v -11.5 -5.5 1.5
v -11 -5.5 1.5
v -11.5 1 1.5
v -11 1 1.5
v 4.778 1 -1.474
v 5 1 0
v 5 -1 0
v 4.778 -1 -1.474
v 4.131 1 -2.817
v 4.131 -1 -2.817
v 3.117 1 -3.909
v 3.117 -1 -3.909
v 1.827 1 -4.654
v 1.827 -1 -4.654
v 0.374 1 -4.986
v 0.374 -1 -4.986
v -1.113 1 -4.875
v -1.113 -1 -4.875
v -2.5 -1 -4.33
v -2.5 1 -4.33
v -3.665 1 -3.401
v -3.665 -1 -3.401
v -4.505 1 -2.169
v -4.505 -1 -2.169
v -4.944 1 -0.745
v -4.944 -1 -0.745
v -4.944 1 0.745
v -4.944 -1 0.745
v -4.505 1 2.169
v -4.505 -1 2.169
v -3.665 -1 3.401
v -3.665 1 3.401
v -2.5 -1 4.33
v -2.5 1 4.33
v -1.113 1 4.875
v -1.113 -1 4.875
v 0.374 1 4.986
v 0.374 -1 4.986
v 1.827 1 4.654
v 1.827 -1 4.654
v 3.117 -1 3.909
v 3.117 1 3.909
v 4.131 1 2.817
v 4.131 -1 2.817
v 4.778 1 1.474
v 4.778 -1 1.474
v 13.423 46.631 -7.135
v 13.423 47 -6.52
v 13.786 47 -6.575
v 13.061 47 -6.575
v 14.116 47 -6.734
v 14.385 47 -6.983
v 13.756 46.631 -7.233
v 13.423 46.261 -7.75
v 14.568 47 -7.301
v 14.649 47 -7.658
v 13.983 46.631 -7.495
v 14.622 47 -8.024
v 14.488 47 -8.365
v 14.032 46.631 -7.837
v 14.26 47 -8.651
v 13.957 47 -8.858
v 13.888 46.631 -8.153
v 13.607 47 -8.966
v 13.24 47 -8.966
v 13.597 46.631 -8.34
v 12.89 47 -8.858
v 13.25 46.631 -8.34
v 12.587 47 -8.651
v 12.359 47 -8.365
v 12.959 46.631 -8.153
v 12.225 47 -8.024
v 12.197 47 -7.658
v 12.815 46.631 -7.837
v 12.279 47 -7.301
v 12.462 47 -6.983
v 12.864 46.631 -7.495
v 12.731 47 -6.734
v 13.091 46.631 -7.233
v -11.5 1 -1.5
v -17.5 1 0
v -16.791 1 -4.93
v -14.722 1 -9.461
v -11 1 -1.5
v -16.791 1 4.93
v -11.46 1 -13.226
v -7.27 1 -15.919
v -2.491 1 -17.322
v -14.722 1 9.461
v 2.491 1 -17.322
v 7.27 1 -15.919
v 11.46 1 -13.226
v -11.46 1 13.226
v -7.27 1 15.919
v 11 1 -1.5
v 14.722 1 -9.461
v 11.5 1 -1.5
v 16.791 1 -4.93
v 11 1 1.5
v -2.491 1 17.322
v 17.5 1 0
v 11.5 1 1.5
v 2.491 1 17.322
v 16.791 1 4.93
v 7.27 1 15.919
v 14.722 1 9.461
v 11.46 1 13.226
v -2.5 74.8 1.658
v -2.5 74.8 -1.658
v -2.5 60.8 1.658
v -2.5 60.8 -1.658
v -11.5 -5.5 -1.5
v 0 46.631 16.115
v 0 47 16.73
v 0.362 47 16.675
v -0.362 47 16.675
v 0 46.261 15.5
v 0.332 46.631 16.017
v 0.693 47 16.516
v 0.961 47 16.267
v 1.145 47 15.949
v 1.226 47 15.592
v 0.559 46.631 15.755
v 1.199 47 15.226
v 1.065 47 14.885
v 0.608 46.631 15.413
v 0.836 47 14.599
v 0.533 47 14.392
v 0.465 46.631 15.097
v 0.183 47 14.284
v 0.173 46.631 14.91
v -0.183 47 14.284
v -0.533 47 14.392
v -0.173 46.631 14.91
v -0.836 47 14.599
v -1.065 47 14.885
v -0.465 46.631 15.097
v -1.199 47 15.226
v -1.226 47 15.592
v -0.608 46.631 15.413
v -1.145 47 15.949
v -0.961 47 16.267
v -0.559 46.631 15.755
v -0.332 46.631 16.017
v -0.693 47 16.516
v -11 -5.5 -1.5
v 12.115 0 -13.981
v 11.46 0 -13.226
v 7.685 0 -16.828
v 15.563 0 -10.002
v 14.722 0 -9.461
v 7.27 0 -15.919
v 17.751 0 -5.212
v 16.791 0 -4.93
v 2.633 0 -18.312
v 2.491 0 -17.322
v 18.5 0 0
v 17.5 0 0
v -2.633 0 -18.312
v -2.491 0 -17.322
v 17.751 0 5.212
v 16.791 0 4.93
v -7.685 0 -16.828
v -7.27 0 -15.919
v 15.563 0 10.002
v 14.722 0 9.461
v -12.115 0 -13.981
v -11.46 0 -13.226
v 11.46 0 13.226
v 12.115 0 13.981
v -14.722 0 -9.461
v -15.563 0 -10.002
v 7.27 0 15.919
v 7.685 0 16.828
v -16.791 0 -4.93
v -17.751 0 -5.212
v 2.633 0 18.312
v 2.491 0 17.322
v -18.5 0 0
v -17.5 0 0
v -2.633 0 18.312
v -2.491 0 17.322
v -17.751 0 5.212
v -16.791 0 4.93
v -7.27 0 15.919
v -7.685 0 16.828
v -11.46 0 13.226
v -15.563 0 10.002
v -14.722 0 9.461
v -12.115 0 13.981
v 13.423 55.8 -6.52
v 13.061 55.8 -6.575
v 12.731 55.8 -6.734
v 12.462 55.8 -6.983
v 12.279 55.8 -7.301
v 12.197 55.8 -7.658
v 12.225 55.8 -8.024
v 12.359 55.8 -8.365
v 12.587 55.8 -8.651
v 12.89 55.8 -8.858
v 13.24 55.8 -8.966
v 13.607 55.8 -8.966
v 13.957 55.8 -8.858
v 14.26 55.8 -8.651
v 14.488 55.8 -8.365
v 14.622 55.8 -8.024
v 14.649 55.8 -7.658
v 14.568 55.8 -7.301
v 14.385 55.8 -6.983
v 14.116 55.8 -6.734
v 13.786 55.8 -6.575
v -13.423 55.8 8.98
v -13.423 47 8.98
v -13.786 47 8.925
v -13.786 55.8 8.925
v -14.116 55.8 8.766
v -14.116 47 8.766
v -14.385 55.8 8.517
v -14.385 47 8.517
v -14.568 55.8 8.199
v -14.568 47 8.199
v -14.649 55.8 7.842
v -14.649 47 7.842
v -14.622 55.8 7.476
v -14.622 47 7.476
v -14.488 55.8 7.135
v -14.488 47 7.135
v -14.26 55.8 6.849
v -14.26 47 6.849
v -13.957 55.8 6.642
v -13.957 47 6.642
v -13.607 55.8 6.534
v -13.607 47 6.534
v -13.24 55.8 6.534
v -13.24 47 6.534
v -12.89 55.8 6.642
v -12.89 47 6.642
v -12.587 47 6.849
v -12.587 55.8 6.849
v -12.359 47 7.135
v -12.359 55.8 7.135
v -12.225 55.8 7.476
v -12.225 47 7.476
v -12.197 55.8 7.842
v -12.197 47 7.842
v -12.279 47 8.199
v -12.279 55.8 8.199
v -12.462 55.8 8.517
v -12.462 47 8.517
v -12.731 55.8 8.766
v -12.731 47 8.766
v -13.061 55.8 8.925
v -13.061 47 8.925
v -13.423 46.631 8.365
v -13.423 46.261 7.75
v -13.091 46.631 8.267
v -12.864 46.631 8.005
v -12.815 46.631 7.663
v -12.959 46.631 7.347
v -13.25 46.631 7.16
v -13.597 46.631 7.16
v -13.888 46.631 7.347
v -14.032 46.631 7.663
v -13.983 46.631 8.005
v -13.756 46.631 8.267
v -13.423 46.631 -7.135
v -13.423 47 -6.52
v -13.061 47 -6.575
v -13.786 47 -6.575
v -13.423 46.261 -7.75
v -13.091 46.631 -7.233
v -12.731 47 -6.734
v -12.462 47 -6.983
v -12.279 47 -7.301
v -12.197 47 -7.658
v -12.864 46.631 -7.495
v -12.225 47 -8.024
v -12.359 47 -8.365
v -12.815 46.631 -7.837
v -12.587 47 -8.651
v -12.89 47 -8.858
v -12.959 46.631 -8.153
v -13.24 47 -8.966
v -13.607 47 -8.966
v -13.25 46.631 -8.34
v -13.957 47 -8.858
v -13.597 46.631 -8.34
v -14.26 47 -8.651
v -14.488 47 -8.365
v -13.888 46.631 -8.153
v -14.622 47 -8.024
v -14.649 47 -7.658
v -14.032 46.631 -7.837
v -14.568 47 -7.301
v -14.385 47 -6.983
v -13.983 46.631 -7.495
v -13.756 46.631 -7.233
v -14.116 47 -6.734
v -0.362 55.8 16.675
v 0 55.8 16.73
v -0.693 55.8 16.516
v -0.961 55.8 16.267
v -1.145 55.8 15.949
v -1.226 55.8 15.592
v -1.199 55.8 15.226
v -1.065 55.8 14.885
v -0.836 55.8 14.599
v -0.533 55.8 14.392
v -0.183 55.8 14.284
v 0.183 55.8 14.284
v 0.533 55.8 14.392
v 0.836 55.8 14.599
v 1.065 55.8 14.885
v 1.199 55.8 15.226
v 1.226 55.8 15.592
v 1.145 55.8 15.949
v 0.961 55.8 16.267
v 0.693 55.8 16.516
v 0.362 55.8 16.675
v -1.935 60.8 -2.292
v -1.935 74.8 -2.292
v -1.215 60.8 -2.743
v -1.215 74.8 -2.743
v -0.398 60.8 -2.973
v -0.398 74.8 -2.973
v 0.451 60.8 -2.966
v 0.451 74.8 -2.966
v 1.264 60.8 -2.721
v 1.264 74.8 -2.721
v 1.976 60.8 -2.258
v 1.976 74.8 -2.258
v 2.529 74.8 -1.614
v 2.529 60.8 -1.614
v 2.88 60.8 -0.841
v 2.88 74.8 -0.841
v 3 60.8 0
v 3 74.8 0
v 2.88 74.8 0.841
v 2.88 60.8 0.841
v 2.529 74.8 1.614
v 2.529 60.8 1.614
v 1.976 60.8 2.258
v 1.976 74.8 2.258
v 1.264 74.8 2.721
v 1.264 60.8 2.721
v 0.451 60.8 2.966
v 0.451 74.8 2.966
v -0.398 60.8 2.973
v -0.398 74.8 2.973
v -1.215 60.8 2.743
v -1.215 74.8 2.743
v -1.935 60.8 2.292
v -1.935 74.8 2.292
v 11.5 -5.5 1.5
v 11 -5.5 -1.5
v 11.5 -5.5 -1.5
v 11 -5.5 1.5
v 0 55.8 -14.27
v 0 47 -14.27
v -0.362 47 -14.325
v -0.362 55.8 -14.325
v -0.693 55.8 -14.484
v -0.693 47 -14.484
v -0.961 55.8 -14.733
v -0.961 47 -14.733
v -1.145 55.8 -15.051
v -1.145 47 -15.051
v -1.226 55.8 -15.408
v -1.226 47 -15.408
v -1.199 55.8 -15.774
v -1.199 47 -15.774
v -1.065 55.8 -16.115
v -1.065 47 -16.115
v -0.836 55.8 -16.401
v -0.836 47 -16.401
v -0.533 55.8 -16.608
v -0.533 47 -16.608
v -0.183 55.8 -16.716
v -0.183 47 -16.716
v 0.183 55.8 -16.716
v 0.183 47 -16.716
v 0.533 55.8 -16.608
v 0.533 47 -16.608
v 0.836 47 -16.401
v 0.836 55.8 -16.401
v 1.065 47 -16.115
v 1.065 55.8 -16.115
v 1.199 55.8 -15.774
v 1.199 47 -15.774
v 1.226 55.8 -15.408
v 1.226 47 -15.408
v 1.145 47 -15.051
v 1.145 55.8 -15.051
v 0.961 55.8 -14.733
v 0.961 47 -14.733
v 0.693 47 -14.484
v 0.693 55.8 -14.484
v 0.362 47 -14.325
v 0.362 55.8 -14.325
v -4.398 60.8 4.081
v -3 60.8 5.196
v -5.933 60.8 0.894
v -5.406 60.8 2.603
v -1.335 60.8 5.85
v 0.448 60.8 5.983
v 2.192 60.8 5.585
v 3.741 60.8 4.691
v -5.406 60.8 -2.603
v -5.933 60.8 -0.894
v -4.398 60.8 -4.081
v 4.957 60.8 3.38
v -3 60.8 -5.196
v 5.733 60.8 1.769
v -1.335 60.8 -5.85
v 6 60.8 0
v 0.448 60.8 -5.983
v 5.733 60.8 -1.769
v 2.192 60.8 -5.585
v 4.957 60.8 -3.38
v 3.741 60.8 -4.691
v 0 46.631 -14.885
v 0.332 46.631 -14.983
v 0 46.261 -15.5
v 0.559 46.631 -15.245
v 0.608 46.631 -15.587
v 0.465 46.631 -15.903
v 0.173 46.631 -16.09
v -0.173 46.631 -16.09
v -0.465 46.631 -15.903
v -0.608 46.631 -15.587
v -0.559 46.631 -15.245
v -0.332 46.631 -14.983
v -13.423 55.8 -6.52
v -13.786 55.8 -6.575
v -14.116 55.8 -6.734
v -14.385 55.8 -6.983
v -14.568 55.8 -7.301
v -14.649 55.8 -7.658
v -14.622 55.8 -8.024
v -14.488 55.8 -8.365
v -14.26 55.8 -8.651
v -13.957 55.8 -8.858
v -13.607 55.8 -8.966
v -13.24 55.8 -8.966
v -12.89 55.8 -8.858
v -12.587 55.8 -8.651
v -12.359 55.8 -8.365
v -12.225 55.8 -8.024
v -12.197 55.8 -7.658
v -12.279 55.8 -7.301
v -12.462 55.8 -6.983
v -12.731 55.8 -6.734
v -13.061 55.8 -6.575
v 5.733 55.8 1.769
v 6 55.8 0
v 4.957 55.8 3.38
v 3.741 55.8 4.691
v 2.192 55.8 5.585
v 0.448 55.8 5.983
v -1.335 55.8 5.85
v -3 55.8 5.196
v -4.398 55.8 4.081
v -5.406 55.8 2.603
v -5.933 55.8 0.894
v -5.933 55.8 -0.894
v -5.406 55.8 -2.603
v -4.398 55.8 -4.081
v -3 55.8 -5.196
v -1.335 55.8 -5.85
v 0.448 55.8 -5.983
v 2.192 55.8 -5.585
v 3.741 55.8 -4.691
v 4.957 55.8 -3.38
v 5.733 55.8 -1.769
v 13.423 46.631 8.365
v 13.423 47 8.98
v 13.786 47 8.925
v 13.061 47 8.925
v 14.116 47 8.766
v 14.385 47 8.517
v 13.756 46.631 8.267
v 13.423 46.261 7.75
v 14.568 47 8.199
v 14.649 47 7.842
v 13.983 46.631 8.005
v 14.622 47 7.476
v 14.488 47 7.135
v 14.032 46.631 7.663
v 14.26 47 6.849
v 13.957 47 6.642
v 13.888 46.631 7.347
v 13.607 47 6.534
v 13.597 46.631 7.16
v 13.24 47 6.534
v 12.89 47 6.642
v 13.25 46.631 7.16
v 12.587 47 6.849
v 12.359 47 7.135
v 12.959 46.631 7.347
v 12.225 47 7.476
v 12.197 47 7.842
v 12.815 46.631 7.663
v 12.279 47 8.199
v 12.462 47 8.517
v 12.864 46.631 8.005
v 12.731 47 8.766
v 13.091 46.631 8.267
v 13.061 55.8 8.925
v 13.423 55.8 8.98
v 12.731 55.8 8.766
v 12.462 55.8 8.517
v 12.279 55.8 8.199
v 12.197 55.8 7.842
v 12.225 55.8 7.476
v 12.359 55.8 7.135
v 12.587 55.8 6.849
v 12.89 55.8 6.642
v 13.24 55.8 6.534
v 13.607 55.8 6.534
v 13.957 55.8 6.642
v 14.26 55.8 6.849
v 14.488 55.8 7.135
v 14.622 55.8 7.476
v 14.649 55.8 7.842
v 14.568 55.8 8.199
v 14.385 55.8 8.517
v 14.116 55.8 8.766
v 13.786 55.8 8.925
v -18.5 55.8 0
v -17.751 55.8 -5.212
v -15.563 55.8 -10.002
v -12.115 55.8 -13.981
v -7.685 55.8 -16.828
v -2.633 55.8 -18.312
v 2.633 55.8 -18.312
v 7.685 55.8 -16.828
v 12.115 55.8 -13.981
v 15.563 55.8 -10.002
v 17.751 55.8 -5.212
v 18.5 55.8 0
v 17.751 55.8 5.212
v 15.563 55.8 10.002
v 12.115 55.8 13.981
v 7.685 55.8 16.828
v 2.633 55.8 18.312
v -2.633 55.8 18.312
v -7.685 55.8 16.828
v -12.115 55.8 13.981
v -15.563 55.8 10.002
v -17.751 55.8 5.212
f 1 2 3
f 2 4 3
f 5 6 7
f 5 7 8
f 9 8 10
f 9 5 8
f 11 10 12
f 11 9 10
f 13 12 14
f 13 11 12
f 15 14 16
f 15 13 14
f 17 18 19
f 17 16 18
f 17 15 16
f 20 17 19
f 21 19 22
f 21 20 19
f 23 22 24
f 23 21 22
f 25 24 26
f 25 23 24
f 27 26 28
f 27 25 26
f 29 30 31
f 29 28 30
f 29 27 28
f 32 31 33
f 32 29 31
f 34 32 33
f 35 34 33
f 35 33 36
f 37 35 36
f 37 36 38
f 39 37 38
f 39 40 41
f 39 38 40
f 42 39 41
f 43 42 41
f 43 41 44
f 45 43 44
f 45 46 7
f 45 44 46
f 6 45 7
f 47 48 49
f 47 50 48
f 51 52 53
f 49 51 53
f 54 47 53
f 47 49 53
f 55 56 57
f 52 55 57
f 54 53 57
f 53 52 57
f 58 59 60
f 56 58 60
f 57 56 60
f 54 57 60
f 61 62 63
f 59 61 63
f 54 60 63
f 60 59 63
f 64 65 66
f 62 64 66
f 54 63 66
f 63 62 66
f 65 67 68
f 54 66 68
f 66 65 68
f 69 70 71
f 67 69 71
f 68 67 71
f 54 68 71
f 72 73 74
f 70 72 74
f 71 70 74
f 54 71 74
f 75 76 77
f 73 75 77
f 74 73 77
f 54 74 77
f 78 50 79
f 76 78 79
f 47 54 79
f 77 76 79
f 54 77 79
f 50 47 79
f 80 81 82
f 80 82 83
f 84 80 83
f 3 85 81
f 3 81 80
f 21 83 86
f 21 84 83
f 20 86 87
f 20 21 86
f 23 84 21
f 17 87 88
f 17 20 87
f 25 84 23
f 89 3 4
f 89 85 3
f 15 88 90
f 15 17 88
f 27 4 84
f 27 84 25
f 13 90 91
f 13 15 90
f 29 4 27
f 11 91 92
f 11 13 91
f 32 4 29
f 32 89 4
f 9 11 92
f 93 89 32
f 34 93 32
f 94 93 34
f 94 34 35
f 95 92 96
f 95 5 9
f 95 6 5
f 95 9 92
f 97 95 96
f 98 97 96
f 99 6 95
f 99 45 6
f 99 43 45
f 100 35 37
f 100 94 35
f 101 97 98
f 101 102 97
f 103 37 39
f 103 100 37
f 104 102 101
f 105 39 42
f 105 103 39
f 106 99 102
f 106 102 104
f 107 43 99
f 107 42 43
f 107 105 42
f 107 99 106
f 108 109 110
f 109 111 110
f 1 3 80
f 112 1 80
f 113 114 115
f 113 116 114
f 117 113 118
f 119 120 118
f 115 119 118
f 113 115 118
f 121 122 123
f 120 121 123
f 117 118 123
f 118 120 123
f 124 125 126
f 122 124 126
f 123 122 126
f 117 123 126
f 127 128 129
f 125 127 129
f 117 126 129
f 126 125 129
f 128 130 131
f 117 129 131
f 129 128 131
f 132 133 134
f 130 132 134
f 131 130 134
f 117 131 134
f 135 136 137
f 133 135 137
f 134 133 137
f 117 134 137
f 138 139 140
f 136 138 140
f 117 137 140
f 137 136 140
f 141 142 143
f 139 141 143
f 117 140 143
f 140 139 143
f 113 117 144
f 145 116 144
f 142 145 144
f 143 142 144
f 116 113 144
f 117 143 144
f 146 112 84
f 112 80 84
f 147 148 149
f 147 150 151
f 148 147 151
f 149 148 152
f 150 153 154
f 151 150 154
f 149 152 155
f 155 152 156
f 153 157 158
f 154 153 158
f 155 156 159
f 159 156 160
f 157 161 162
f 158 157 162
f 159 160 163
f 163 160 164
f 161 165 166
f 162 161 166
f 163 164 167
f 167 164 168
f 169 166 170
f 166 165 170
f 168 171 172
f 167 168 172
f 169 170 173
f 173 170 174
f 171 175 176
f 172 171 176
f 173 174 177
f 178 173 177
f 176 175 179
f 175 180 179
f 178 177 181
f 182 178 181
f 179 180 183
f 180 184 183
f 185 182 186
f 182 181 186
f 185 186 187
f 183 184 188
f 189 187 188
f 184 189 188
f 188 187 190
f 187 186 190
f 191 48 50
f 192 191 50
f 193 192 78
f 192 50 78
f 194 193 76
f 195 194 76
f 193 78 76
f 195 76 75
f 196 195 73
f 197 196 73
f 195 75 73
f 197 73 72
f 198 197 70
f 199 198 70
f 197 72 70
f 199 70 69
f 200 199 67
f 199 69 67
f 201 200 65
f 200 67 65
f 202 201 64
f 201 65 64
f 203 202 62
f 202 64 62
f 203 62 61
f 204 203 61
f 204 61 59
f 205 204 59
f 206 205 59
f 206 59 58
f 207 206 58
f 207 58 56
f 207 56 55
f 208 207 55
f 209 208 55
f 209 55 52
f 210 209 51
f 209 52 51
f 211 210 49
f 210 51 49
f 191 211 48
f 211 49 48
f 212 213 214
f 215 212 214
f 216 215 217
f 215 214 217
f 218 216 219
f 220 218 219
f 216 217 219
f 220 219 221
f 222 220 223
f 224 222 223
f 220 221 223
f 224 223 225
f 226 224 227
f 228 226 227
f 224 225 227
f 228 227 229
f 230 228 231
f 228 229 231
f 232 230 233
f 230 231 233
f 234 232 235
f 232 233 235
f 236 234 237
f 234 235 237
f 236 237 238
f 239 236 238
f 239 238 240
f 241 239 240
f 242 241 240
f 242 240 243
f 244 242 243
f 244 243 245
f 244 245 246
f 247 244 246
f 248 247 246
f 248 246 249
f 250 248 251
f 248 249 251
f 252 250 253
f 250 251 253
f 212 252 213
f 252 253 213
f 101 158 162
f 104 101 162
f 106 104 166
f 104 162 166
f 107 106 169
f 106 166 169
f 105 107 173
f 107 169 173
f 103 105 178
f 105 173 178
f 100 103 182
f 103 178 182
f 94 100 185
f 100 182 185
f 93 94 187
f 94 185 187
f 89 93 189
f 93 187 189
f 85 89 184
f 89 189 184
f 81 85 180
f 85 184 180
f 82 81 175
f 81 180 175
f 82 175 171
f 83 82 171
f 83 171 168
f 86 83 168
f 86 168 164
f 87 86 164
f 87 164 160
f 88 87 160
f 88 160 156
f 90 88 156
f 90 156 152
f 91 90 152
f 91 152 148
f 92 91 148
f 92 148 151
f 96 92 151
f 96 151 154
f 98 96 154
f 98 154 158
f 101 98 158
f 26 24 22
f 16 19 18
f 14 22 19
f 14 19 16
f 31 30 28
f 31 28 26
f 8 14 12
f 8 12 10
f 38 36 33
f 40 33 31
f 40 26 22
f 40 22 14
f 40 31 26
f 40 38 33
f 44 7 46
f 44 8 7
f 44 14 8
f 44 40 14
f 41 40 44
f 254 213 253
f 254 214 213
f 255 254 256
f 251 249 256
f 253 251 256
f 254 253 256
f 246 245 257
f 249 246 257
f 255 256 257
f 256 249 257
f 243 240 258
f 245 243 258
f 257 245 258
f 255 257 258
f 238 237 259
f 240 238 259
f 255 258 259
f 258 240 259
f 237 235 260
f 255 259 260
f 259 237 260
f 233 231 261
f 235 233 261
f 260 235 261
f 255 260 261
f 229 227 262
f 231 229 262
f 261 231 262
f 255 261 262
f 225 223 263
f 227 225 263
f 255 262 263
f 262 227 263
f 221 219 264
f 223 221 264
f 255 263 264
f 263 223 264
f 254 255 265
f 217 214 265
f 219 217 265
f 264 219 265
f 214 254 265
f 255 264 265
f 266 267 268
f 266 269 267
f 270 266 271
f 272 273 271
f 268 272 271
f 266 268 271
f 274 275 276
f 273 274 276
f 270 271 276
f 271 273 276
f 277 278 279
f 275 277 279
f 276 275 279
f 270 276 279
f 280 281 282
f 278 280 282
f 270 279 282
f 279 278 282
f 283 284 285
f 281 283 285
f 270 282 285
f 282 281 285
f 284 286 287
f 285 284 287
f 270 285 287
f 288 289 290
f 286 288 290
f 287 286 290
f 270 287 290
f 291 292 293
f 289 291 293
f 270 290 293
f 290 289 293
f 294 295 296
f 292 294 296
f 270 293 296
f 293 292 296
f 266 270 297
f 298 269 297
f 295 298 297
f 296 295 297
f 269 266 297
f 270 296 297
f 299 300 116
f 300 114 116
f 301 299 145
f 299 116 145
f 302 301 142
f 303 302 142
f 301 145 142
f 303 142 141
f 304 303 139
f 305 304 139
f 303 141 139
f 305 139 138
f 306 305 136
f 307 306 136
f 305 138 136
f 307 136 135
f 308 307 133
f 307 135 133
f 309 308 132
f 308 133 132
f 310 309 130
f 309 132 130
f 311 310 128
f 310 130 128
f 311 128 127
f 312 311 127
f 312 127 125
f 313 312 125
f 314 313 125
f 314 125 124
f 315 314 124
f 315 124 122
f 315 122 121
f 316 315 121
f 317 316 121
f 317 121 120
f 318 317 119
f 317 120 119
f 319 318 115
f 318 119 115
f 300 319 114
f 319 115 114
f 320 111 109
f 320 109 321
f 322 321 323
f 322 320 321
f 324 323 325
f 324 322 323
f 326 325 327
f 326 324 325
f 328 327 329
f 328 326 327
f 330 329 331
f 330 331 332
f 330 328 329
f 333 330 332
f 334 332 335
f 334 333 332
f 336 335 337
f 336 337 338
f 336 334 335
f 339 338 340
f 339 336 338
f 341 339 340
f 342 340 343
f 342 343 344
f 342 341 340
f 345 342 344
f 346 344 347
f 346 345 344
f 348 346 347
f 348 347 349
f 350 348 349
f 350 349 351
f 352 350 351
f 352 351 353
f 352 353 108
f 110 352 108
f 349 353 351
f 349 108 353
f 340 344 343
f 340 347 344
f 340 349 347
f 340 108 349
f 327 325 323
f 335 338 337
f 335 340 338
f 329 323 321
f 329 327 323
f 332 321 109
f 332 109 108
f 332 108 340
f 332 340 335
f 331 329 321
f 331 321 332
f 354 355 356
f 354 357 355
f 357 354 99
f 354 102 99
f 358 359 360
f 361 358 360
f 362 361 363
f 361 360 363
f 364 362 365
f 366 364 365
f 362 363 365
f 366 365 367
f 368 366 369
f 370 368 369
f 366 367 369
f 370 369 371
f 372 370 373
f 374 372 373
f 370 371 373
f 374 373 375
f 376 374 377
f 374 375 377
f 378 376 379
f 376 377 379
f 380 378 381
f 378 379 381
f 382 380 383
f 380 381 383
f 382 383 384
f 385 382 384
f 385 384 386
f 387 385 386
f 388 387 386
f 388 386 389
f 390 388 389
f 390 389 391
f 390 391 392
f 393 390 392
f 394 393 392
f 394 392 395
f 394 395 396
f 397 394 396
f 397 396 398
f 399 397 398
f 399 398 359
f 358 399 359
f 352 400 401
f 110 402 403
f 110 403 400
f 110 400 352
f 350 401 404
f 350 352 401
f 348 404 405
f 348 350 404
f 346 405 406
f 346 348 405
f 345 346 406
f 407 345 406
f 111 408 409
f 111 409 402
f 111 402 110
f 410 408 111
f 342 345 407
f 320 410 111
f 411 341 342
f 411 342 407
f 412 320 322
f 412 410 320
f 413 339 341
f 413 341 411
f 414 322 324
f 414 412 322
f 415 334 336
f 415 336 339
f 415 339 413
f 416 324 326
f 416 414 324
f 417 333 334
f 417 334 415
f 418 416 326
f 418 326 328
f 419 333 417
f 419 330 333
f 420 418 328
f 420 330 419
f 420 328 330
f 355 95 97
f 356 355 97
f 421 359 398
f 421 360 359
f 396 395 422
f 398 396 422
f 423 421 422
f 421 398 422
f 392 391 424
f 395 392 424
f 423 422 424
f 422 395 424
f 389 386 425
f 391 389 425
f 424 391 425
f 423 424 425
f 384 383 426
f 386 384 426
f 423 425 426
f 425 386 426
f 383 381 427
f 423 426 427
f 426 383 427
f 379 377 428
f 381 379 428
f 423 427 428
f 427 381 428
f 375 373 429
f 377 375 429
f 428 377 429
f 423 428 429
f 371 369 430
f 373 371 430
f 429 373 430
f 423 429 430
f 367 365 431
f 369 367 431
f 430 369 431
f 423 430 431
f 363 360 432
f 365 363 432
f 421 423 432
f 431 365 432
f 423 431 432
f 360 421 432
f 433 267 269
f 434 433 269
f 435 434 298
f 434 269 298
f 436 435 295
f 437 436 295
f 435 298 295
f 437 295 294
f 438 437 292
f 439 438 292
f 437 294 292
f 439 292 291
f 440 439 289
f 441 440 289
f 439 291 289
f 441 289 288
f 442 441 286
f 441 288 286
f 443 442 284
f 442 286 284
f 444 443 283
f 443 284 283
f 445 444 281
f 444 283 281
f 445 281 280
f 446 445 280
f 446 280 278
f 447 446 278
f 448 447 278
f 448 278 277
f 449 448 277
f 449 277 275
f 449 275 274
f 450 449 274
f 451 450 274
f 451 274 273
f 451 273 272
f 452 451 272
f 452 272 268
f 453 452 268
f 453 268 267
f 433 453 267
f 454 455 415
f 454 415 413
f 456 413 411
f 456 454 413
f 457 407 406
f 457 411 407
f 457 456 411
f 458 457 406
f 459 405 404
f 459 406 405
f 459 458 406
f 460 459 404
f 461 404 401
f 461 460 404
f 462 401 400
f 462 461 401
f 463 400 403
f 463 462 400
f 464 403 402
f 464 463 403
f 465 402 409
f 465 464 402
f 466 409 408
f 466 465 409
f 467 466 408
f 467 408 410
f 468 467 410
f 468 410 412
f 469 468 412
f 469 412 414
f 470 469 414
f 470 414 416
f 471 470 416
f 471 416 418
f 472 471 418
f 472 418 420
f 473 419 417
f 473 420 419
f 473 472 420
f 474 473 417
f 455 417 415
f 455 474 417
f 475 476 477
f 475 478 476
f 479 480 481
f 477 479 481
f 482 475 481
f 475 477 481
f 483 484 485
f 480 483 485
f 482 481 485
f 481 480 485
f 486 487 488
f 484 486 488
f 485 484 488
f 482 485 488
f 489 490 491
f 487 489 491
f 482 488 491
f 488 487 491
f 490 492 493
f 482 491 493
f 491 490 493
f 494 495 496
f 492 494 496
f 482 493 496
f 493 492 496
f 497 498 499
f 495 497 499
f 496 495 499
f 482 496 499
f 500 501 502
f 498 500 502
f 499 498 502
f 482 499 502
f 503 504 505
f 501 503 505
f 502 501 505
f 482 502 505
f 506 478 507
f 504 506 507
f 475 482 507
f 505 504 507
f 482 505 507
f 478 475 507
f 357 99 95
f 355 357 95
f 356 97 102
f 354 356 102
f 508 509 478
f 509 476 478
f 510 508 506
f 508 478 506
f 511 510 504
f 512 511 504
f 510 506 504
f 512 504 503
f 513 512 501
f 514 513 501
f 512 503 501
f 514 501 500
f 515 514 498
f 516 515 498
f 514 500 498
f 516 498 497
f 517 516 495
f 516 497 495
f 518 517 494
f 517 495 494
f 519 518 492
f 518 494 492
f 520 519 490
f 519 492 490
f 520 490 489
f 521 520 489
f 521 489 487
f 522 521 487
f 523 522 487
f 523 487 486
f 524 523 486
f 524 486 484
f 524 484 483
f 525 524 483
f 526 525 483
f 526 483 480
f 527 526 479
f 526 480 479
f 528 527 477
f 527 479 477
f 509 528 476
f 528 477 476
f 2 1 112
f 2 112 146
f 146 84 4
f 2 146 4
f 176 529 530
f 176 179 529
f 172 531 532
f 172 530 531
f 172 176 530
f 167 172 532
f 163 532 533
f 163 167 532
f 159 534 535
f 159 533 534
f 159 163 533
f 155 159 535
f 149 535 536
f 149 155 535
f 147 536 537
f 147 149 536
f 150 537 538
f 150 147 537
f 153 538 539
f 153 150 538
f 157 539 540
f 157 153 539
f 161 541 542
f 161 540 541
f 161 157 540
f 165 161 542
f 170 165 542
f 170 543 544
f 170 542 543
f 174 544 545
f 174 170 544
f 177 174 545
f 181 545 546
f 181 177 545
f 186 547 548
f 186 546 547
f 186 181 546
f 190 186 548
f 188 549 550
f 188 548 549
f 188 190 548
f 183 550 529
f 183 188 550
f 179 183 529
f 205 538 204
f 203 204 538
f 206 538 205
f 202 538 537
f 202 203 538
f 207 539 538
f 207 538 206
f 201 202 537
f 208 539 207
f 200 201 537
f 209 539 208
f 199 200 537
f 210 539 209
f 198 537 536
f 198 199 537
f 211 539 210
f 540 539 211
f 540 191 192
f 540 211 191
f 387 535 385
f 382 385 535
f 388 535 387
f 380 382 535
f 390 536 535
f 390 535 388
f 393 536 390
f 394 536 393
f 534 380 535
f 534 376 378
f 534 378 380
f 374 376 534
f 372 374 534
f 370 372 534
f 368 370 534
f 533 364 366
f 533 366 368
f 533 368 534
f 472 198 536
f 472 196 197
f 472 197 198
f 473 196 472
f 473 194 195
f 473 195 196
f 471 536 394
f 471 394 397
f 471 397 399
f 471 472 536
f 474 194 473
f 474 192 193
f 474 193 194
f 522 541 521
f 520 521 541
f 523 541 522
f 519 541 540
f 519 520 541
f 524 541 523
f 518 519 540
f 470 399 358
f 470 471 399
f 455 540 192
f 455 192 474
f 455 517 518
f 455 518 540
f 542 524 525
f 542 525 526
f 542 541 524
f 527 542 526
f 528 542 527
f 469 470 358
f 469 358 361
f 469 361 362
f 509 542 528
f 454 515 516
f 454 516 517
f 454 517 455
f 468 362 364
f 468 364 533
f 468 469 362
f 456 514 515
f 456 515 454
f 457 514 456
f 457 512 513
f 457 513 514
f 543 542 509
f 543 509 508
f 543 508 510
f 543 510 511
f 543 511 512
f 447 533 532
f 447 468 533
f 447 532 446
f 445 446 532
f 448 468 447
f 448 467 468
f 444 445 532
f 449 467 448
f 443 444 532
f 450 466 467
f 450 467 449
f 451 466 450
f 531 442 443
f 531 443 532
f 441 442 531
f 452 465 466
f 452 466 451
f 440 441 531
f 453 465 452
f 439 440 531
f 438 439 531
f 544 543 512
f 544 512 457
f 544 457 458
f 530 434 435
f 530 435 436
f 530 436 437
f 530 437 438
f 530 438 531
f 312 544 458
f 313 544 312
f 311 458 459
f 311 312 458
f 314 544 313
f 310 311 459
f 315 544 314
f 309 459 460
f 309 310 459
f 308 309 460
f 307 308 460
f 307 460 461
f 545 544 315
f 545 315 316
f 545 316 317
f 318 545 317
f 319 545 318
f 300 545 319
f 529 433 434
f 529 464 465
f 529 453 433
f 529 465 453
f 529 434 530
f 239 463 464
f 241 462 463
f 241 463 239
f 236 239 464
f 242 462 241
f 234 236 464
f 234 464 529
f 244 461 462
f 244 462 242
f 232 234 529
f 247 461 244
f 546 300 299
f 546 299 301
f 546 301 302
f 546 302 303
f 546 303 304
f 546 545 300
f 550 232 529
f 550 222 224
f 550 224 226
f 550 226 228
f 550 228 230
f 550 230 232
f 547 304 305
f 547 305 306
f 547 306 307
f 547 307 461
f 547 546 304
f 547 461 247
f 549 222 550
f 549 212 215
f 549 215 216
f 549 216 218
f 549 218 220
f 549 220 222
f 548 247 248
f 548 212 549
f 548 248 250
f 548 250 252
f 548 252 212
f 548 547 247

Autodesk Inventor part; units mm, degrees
ref_plane "YZ Plane" through (0, 0, 0) normal (1, 0, 0) x (0, 1, 0)
ref_plane "XZ Plane" through (0, 0, 0) normal (0, 1, 0) x (-1, 0, 0)
ref_plane "XY Plane" through (0, 0, 0) normal (0, 0, 1) x (1, 0, 0)
sketch "Sketch1" plane through (0, 0, 0) normal (0, 1, 0) x (-1, 0, 0)
  circle A0 centre (0, 0) radius 18.5
  dimension "d0" = 37
extrude "Extrusion1" add sketch "Sketch1" along normal blind 55.8
sketch "Sketch2" plane through (0, 55.8, 0) normal (0, 1, 0) x (1, 0, 0)
  circle A0 centre (0, 0) radius 6
  dimension "d3" = 12
extrude "Extrusion2" add sketch "Sketch2" along normal blind 5
sketch "Sketch3" plane through (0, 60.8, 0) normal (0, 1, 0) x (1, 0, 0)
  circle A0 centre (0, 0) radius 3
  line L0 (-2.5, -3) -> (3, -3)
  line L1 (3, -3) -> (3, 3)
  line L2 (3, 3) -> (-2.5, 3)
  line L3 (-2.5, 3) -> (-2.5, -3)
  point P0 (-2.5, 1.6583)
  point P1 (-2.5, -1.6583)
  dimension "d6" = 6
  dimension "d7" = 5.5
extrude "Extrusion3" add sketch "Sketch3" along normal blind 14 contours A0 L3 picked at (0.6006, -0.3482)
sketch "Sketch4" plane through (0, 0, 0) normal (0, -1, 0) x (1, 0, 0)
  circle A0 centre (0, 0) radius 17.5
  circle A1 centre (0, 0) radius 18.5 projected
  dimension "d27" = 1
extrude "Extrusion4" cut sketch "Sketch4" against normal blind 1 contours A0
sketch "Sketch5" plane through (0, 1, 0) normal (0, -1, 0) x (1, 0, 0)
  circle A0 centre (0, 0) radius 18.5 projected
  circle A1 centre (0, 0) radius 5
  dimension "d13" = 10
extrude "Extrusion5" add sketch "Sketch5" along normal blind 2 contours A1
sketch "Sketch7" plane through (0, 55.8, 0) normal (0, 1, 0) x (1, 0, 0)
  line L0 (0, 25.9) -> (0, -25.9) projected
  point P0 (0, 0)
  point P1 (0, 15.5)
  point P2 (-13.4234, 7.75)
  point P3 (-13.4234, -7.75)
  point P4 (0, -15.5)
  point P5 (13.4234, -7.75)
  point P6 (13.4234, 7.75)
  dimension "d35" = 15.5
  dimension "d38" = 360
hole "Hole1" at (-13.4234, 55.8, -7.75) at (-13.4234, 55.8, 7.75) at (13.4234, 55.8, 7.75) at (13.4234, 55.8, -7.75) at (0, 55.8, -15.5) at (0, 55.8, 15.5) direction (0, -1, 0) diameter 2.459 depth 8.8 tip angle 118 thread size "M3x0.5" class "6H" standard "ANSI Metric M Profile"
sketch "Sketch8" plane through (0, 1, 0) normal (0, -1, 0) x (1, 0, 0)
  line L0 (-11.5, -1.5) -> (-11, -1.5)
  line L1 (-11, -1.5) -> (-11, 1.5)
  line L2 (-11, 1.5) -> (-11.5, 1.5)
  line L3 (-11.5, 1.5) -> (-11.5, -1.5)
  line L4 (11, -1.5) -> (11.5, -1.5)
  line L5 (11.5, -1.5) -> (11.5, 1.5)
  line L6 (11.5, 1.5) -> (11, 1.5)
  line L7 (11, 1.5) -> (11, -1.5)
  circle A0 centre (0, 0) radius 5 projected
  circle A1 centre (0, 0) radius 17.5 projected
  line L8 (0, -17.5) -> (0, 17.5) construction
  point P0 (-11, 0)
  point P1 (11, 0)
  dimension "d30" = 23
  dimension "d31" = 0.5
  dimension "d32" = 0.5
  dimension "d33" = 3
  dimension "d34" = 3
extrude "Extrusion7" add sketch "Sketch8" along normal blind 6.5 contours L3 L2 L1 L0 | L7 L6 L5 L4
properties part number "Motor24V_V1" material "Steel"
